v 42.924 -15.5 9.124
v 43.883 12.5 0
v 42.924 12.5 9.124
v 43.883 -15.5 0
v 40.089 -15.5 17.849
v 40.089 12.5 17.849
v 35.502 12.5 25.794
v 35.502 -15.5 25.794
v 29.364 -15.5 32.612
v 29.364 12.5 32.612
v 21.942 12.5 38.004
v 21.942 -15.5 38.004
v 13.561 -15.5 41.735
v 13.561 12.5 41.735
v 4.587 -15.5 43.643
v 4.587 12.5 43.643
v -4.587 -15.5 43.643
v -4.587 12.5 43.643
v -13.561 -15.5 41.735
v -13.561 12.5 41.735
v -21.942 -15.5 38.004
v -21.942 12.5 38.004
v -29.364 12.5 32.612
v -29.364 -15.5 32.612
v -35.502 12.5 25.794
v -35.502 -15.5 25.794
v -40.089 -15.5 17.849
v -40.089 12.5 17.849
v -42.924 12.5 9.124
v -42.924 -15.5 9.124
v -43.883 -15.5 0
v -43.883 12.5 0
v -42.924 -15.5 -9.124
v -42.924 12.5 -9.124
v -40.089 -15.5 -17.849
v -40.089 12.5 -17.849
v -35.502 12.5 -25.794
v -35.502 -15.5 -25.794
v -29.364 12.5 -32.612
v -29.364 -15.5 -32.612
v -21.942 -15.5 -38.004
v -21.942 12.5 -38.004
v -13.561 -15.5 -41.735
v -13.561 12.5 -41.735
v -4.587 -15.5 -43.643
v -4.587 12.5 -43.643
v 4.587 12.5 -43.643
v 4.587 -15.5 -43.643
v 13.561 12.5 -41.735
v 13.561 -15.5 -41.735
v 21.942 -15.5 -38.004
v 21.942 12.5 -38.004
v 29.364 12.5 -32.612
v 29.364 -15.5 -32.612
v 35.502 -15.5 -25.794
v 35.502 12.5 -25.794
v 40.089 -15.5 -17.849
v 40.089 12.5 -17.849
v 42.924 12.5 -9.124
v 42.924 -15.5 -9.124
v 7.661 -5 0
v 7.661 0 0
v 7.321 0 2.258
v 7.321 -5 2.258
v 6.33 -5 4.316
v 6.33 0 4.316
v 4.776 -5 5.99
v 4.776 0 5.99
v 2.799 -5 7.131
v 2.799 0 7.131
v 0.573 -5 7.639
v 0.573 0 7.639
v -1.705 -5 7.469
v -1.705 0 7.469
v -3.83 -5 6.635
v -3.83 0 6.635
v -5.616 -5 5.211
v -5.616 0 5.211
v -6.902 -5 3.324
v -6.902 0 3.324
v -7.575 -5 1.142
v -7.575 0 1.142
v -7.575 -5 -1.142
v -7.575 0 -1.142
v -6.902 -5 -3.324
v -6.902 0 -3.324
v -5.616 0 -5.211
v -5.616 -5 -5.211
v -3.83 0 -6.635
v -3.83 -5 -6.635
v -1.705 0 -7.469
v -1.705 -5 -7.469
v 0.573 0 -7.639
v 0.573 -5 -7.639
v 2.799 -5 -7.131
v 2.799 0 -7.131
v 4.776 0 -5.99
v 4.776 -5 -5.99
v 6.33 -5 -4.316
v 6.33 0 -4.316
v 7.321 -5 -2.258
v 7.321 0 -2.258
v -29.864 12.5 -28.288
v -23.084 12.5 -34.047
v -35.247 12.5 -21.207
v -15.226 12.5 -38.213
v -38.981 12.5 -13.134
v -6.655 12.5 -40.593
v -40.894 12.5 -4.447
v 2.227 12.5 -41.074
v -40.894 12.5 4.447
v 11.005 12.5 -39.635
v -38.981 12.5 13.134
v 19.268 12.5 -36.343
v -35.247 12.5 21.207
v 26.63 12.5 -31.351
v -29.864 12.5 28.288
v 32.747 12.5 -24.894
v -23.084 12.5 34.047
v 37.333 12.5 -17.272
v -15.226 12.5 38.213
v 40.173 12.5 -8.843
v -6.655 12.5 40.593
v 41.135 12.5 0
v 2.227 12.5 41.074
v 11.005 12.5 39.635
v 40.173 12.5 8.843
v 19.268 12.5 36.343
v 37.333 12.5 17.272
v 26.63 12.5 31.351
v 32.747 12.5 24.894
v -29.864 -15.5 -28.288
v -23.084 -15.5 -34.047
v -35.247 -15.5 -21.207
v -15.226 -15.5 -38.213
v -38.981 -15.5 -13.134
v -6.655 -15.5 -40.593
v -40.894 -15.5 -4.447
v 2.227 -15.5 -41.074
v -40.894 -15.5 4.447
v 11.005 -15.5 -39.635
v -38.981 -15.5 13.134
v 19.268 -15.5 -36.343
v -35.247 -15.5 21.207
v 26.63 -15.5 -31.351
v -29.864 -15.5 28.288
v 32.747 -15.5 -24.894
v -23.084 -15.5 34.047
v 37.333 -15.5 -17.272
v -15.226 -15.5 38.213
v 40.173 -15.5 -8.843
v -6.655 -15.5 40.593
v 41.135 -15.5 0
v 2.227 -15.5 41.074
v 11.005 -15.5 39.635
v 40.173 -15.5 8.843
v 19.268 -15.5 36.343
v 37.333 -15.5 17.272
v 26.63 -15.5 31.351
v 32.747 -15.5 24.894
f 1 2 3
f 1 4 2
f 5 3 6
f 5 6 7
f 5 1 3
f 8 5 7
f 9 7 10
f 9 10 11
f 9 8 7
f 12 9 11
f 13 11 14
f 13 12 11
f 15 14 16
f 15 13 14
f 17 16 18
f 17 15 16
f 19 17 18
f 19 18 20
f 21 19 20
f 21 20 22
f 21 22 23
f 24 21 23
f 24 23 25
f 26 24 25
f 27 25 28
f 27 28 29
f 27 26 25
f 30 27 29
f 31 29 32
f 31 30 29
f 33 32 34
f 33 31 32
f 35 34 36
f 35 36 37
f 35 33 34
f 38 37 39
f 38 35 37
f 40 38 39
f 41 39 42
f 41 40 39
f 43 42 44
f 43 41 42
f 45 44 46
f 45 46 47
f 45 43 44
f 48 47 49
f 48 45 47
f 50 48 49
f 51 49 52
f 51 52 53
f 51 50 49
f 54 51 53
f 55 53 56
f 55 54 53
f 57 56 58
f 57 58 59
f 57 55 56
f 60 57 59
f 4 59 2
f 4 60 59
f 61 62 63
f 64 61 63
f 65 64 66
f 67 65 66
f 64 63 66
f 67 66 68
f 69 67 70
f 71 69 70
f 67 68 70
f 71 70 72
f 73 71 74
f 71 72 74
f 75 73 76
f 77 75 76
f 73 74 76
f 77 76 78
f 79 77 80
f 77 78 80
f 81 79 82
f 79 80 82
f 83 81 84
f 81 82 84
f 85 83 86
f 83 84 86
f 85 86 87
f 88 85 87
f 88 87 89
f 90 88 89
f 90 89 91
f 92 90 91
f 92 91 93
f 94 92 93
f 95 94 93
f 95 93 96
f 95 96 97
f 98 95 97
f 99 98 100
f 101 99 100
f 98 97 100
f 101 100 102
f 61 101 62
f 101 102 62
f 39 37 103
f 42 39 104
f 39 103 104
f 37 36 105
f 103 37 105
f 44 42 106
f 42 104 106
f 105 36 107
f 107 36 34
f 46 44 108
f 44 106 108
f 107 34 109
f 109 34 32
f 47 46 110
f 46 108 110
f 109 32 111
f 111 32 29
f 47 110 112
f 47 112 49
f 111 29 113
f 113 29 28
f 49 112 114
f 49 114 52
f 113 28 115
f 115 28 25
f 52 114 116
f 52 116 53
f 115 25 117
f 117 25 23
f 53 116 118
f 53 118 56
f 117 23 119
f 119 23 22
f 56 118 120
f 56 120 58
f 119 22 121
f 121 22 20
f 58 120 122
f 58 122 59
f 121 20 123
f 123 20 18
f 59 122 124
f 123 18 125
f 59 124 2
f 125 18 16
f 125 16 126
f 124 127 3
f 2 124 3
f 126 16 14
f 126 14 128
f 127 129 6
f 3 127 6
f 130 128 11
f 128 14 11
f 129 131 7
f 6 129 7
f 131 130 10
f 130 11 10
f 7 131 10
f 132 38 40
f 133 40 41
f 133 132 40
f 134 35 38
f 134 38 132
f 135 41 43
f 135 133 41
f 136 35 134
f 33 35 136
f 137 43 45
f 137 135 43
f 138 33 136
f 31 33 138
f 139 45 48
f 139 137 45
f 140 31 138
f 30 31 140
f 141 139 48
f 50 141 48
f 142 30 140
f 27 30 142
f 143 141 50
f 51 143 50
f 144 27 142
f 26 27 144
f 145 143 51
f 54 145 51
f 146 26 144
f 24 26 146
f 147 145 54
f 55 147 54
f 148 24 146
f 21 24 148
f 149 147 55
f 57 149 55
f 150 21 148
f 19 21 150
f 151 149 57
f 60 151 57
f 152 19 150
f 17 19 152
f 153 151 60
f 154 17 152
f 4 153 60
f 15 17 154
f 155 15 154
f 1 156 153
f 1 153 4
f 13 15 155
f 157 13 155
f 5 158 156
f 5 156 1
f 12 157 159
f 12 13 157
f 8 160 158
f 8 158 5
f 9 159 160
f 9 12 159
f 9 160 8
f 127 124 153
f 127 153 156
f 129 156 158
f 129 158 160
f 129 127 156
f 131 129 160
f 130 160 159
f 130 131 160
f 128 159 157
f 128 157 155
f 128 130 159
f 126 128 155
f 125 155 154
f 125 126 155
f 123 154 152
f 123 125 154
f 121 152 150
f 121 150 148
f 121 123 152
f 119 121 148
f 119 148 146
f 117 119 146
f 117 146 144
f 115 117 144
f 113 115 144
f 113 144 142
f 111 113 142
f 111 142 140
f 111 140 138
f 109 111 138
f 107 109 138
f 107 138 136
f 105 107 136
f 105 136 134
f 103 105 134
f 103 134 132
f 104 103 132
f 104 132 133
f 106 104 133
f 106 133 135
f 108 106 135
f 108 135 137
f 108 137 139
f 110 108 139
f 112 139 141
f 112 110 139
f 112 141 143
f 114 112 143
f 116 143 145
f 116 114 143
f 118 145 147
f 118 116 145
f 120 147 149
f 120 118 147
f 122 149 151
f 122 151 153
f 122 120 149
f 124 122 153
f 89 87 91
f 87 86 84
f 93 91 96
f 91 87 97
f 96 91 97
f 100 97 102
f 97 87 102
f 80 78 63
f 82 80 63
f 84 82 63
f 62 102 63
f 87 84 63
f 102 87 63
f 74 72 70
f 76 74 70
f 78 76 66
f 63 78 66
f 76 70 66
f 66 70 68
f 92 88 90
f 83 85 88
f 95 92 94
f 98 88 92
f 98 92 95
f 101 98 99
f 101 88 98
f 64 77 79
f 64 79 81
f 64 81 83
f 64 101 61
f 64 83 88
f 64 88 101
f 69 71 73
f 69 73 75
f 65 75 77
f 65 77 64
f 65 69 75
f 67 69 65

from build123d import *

# Parameters (mm, degrees)
F0_R     = 7.6609031883
F1_DEPTH = 5
F2_R     = 43.8831518485
F2_R_2   = 41.1346697105
F3_DEPTH = 15.5
F4_DEPTH = 25
F5_DEPTH = 12.5


# Not quite as in the source:
# - the program builds the solid bodies; features that only make, move or delete a surface that nothing else refers to are left out


with BuildPart() as f1:
    # F0 (on Front) → F1 (new body)
    with BuildSketch(Plane.XZ):
        Circle(F0_R)
    extrude(amount=F1_DEPTH)


with BuildPart() as f3:
    # F2 (on Front) → F3 (new body, symmetric)
    with BuildSketch(Plane.XZ):
        Circle(F2_R)
        Circle(F2_R_2, mode=Mode.SUBTRACT)
    extrude(amount=F3_DEPTH, both=True)

    # F2 (on Front) → F4 (cut)
    with BuildSketch(Plane.XZ):
        Circle(F2_R)
        Circle(F2_R_2, mode=Mode.SUBTRACT)
    extrude(amount=-F4_DEPTH, mode=Mode.SUBTRACT)

    # F2 (on Front) → F5 (join, symmetric)
    with BuildSketch(Plane.XZ):
        Circle(F2_R)
        Circle(F2_R_2, mode=Mode.SUBTRACT)
    extrude(amount=F5_DEPTH, both=True)


solid = Compound([f1.part, f3.part])
